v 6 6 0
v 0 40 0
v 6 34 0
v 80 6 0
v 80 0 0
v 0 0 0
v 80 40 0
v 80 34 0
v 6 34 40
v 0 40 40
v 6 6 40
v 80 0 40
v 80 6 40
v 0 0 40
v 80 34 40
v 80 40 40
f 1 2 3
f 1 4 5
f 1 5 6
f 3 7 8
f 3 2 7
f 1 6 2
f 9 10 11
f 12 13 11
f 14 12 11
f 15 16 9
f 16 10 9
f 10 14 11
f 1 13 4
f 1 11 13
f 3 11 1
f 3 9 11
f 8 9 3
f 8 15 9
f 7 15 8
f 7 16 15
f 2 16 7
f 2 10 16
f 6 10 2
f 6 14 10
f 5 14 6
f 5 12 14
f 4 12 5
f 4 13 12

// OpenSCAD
$fn = 32;

// ----------------------------------------------------------------------
// Structural section: channel 80 x 40 mm
// ----------------------------------------------------------------------

// --- parameters (mm) ---
sec_w = 80;               // channel width, X
sec_h = 40;               // channel height, Y
flange_t = 6;             // flange thickness
web_t = 6;                // web thickness
plate_t = 40;             // cut length, Z (extrusion height)

profile = [[0, 0], [80, 0], [80, 6], [6, 6], [6, 34], [80, 34], [80, 40], [0, 40]];  // primary outline, 8 points, counter clockwise

// --- the one profile operation ---
linear_extrude(height = plate_t) polygon(points = profile);
